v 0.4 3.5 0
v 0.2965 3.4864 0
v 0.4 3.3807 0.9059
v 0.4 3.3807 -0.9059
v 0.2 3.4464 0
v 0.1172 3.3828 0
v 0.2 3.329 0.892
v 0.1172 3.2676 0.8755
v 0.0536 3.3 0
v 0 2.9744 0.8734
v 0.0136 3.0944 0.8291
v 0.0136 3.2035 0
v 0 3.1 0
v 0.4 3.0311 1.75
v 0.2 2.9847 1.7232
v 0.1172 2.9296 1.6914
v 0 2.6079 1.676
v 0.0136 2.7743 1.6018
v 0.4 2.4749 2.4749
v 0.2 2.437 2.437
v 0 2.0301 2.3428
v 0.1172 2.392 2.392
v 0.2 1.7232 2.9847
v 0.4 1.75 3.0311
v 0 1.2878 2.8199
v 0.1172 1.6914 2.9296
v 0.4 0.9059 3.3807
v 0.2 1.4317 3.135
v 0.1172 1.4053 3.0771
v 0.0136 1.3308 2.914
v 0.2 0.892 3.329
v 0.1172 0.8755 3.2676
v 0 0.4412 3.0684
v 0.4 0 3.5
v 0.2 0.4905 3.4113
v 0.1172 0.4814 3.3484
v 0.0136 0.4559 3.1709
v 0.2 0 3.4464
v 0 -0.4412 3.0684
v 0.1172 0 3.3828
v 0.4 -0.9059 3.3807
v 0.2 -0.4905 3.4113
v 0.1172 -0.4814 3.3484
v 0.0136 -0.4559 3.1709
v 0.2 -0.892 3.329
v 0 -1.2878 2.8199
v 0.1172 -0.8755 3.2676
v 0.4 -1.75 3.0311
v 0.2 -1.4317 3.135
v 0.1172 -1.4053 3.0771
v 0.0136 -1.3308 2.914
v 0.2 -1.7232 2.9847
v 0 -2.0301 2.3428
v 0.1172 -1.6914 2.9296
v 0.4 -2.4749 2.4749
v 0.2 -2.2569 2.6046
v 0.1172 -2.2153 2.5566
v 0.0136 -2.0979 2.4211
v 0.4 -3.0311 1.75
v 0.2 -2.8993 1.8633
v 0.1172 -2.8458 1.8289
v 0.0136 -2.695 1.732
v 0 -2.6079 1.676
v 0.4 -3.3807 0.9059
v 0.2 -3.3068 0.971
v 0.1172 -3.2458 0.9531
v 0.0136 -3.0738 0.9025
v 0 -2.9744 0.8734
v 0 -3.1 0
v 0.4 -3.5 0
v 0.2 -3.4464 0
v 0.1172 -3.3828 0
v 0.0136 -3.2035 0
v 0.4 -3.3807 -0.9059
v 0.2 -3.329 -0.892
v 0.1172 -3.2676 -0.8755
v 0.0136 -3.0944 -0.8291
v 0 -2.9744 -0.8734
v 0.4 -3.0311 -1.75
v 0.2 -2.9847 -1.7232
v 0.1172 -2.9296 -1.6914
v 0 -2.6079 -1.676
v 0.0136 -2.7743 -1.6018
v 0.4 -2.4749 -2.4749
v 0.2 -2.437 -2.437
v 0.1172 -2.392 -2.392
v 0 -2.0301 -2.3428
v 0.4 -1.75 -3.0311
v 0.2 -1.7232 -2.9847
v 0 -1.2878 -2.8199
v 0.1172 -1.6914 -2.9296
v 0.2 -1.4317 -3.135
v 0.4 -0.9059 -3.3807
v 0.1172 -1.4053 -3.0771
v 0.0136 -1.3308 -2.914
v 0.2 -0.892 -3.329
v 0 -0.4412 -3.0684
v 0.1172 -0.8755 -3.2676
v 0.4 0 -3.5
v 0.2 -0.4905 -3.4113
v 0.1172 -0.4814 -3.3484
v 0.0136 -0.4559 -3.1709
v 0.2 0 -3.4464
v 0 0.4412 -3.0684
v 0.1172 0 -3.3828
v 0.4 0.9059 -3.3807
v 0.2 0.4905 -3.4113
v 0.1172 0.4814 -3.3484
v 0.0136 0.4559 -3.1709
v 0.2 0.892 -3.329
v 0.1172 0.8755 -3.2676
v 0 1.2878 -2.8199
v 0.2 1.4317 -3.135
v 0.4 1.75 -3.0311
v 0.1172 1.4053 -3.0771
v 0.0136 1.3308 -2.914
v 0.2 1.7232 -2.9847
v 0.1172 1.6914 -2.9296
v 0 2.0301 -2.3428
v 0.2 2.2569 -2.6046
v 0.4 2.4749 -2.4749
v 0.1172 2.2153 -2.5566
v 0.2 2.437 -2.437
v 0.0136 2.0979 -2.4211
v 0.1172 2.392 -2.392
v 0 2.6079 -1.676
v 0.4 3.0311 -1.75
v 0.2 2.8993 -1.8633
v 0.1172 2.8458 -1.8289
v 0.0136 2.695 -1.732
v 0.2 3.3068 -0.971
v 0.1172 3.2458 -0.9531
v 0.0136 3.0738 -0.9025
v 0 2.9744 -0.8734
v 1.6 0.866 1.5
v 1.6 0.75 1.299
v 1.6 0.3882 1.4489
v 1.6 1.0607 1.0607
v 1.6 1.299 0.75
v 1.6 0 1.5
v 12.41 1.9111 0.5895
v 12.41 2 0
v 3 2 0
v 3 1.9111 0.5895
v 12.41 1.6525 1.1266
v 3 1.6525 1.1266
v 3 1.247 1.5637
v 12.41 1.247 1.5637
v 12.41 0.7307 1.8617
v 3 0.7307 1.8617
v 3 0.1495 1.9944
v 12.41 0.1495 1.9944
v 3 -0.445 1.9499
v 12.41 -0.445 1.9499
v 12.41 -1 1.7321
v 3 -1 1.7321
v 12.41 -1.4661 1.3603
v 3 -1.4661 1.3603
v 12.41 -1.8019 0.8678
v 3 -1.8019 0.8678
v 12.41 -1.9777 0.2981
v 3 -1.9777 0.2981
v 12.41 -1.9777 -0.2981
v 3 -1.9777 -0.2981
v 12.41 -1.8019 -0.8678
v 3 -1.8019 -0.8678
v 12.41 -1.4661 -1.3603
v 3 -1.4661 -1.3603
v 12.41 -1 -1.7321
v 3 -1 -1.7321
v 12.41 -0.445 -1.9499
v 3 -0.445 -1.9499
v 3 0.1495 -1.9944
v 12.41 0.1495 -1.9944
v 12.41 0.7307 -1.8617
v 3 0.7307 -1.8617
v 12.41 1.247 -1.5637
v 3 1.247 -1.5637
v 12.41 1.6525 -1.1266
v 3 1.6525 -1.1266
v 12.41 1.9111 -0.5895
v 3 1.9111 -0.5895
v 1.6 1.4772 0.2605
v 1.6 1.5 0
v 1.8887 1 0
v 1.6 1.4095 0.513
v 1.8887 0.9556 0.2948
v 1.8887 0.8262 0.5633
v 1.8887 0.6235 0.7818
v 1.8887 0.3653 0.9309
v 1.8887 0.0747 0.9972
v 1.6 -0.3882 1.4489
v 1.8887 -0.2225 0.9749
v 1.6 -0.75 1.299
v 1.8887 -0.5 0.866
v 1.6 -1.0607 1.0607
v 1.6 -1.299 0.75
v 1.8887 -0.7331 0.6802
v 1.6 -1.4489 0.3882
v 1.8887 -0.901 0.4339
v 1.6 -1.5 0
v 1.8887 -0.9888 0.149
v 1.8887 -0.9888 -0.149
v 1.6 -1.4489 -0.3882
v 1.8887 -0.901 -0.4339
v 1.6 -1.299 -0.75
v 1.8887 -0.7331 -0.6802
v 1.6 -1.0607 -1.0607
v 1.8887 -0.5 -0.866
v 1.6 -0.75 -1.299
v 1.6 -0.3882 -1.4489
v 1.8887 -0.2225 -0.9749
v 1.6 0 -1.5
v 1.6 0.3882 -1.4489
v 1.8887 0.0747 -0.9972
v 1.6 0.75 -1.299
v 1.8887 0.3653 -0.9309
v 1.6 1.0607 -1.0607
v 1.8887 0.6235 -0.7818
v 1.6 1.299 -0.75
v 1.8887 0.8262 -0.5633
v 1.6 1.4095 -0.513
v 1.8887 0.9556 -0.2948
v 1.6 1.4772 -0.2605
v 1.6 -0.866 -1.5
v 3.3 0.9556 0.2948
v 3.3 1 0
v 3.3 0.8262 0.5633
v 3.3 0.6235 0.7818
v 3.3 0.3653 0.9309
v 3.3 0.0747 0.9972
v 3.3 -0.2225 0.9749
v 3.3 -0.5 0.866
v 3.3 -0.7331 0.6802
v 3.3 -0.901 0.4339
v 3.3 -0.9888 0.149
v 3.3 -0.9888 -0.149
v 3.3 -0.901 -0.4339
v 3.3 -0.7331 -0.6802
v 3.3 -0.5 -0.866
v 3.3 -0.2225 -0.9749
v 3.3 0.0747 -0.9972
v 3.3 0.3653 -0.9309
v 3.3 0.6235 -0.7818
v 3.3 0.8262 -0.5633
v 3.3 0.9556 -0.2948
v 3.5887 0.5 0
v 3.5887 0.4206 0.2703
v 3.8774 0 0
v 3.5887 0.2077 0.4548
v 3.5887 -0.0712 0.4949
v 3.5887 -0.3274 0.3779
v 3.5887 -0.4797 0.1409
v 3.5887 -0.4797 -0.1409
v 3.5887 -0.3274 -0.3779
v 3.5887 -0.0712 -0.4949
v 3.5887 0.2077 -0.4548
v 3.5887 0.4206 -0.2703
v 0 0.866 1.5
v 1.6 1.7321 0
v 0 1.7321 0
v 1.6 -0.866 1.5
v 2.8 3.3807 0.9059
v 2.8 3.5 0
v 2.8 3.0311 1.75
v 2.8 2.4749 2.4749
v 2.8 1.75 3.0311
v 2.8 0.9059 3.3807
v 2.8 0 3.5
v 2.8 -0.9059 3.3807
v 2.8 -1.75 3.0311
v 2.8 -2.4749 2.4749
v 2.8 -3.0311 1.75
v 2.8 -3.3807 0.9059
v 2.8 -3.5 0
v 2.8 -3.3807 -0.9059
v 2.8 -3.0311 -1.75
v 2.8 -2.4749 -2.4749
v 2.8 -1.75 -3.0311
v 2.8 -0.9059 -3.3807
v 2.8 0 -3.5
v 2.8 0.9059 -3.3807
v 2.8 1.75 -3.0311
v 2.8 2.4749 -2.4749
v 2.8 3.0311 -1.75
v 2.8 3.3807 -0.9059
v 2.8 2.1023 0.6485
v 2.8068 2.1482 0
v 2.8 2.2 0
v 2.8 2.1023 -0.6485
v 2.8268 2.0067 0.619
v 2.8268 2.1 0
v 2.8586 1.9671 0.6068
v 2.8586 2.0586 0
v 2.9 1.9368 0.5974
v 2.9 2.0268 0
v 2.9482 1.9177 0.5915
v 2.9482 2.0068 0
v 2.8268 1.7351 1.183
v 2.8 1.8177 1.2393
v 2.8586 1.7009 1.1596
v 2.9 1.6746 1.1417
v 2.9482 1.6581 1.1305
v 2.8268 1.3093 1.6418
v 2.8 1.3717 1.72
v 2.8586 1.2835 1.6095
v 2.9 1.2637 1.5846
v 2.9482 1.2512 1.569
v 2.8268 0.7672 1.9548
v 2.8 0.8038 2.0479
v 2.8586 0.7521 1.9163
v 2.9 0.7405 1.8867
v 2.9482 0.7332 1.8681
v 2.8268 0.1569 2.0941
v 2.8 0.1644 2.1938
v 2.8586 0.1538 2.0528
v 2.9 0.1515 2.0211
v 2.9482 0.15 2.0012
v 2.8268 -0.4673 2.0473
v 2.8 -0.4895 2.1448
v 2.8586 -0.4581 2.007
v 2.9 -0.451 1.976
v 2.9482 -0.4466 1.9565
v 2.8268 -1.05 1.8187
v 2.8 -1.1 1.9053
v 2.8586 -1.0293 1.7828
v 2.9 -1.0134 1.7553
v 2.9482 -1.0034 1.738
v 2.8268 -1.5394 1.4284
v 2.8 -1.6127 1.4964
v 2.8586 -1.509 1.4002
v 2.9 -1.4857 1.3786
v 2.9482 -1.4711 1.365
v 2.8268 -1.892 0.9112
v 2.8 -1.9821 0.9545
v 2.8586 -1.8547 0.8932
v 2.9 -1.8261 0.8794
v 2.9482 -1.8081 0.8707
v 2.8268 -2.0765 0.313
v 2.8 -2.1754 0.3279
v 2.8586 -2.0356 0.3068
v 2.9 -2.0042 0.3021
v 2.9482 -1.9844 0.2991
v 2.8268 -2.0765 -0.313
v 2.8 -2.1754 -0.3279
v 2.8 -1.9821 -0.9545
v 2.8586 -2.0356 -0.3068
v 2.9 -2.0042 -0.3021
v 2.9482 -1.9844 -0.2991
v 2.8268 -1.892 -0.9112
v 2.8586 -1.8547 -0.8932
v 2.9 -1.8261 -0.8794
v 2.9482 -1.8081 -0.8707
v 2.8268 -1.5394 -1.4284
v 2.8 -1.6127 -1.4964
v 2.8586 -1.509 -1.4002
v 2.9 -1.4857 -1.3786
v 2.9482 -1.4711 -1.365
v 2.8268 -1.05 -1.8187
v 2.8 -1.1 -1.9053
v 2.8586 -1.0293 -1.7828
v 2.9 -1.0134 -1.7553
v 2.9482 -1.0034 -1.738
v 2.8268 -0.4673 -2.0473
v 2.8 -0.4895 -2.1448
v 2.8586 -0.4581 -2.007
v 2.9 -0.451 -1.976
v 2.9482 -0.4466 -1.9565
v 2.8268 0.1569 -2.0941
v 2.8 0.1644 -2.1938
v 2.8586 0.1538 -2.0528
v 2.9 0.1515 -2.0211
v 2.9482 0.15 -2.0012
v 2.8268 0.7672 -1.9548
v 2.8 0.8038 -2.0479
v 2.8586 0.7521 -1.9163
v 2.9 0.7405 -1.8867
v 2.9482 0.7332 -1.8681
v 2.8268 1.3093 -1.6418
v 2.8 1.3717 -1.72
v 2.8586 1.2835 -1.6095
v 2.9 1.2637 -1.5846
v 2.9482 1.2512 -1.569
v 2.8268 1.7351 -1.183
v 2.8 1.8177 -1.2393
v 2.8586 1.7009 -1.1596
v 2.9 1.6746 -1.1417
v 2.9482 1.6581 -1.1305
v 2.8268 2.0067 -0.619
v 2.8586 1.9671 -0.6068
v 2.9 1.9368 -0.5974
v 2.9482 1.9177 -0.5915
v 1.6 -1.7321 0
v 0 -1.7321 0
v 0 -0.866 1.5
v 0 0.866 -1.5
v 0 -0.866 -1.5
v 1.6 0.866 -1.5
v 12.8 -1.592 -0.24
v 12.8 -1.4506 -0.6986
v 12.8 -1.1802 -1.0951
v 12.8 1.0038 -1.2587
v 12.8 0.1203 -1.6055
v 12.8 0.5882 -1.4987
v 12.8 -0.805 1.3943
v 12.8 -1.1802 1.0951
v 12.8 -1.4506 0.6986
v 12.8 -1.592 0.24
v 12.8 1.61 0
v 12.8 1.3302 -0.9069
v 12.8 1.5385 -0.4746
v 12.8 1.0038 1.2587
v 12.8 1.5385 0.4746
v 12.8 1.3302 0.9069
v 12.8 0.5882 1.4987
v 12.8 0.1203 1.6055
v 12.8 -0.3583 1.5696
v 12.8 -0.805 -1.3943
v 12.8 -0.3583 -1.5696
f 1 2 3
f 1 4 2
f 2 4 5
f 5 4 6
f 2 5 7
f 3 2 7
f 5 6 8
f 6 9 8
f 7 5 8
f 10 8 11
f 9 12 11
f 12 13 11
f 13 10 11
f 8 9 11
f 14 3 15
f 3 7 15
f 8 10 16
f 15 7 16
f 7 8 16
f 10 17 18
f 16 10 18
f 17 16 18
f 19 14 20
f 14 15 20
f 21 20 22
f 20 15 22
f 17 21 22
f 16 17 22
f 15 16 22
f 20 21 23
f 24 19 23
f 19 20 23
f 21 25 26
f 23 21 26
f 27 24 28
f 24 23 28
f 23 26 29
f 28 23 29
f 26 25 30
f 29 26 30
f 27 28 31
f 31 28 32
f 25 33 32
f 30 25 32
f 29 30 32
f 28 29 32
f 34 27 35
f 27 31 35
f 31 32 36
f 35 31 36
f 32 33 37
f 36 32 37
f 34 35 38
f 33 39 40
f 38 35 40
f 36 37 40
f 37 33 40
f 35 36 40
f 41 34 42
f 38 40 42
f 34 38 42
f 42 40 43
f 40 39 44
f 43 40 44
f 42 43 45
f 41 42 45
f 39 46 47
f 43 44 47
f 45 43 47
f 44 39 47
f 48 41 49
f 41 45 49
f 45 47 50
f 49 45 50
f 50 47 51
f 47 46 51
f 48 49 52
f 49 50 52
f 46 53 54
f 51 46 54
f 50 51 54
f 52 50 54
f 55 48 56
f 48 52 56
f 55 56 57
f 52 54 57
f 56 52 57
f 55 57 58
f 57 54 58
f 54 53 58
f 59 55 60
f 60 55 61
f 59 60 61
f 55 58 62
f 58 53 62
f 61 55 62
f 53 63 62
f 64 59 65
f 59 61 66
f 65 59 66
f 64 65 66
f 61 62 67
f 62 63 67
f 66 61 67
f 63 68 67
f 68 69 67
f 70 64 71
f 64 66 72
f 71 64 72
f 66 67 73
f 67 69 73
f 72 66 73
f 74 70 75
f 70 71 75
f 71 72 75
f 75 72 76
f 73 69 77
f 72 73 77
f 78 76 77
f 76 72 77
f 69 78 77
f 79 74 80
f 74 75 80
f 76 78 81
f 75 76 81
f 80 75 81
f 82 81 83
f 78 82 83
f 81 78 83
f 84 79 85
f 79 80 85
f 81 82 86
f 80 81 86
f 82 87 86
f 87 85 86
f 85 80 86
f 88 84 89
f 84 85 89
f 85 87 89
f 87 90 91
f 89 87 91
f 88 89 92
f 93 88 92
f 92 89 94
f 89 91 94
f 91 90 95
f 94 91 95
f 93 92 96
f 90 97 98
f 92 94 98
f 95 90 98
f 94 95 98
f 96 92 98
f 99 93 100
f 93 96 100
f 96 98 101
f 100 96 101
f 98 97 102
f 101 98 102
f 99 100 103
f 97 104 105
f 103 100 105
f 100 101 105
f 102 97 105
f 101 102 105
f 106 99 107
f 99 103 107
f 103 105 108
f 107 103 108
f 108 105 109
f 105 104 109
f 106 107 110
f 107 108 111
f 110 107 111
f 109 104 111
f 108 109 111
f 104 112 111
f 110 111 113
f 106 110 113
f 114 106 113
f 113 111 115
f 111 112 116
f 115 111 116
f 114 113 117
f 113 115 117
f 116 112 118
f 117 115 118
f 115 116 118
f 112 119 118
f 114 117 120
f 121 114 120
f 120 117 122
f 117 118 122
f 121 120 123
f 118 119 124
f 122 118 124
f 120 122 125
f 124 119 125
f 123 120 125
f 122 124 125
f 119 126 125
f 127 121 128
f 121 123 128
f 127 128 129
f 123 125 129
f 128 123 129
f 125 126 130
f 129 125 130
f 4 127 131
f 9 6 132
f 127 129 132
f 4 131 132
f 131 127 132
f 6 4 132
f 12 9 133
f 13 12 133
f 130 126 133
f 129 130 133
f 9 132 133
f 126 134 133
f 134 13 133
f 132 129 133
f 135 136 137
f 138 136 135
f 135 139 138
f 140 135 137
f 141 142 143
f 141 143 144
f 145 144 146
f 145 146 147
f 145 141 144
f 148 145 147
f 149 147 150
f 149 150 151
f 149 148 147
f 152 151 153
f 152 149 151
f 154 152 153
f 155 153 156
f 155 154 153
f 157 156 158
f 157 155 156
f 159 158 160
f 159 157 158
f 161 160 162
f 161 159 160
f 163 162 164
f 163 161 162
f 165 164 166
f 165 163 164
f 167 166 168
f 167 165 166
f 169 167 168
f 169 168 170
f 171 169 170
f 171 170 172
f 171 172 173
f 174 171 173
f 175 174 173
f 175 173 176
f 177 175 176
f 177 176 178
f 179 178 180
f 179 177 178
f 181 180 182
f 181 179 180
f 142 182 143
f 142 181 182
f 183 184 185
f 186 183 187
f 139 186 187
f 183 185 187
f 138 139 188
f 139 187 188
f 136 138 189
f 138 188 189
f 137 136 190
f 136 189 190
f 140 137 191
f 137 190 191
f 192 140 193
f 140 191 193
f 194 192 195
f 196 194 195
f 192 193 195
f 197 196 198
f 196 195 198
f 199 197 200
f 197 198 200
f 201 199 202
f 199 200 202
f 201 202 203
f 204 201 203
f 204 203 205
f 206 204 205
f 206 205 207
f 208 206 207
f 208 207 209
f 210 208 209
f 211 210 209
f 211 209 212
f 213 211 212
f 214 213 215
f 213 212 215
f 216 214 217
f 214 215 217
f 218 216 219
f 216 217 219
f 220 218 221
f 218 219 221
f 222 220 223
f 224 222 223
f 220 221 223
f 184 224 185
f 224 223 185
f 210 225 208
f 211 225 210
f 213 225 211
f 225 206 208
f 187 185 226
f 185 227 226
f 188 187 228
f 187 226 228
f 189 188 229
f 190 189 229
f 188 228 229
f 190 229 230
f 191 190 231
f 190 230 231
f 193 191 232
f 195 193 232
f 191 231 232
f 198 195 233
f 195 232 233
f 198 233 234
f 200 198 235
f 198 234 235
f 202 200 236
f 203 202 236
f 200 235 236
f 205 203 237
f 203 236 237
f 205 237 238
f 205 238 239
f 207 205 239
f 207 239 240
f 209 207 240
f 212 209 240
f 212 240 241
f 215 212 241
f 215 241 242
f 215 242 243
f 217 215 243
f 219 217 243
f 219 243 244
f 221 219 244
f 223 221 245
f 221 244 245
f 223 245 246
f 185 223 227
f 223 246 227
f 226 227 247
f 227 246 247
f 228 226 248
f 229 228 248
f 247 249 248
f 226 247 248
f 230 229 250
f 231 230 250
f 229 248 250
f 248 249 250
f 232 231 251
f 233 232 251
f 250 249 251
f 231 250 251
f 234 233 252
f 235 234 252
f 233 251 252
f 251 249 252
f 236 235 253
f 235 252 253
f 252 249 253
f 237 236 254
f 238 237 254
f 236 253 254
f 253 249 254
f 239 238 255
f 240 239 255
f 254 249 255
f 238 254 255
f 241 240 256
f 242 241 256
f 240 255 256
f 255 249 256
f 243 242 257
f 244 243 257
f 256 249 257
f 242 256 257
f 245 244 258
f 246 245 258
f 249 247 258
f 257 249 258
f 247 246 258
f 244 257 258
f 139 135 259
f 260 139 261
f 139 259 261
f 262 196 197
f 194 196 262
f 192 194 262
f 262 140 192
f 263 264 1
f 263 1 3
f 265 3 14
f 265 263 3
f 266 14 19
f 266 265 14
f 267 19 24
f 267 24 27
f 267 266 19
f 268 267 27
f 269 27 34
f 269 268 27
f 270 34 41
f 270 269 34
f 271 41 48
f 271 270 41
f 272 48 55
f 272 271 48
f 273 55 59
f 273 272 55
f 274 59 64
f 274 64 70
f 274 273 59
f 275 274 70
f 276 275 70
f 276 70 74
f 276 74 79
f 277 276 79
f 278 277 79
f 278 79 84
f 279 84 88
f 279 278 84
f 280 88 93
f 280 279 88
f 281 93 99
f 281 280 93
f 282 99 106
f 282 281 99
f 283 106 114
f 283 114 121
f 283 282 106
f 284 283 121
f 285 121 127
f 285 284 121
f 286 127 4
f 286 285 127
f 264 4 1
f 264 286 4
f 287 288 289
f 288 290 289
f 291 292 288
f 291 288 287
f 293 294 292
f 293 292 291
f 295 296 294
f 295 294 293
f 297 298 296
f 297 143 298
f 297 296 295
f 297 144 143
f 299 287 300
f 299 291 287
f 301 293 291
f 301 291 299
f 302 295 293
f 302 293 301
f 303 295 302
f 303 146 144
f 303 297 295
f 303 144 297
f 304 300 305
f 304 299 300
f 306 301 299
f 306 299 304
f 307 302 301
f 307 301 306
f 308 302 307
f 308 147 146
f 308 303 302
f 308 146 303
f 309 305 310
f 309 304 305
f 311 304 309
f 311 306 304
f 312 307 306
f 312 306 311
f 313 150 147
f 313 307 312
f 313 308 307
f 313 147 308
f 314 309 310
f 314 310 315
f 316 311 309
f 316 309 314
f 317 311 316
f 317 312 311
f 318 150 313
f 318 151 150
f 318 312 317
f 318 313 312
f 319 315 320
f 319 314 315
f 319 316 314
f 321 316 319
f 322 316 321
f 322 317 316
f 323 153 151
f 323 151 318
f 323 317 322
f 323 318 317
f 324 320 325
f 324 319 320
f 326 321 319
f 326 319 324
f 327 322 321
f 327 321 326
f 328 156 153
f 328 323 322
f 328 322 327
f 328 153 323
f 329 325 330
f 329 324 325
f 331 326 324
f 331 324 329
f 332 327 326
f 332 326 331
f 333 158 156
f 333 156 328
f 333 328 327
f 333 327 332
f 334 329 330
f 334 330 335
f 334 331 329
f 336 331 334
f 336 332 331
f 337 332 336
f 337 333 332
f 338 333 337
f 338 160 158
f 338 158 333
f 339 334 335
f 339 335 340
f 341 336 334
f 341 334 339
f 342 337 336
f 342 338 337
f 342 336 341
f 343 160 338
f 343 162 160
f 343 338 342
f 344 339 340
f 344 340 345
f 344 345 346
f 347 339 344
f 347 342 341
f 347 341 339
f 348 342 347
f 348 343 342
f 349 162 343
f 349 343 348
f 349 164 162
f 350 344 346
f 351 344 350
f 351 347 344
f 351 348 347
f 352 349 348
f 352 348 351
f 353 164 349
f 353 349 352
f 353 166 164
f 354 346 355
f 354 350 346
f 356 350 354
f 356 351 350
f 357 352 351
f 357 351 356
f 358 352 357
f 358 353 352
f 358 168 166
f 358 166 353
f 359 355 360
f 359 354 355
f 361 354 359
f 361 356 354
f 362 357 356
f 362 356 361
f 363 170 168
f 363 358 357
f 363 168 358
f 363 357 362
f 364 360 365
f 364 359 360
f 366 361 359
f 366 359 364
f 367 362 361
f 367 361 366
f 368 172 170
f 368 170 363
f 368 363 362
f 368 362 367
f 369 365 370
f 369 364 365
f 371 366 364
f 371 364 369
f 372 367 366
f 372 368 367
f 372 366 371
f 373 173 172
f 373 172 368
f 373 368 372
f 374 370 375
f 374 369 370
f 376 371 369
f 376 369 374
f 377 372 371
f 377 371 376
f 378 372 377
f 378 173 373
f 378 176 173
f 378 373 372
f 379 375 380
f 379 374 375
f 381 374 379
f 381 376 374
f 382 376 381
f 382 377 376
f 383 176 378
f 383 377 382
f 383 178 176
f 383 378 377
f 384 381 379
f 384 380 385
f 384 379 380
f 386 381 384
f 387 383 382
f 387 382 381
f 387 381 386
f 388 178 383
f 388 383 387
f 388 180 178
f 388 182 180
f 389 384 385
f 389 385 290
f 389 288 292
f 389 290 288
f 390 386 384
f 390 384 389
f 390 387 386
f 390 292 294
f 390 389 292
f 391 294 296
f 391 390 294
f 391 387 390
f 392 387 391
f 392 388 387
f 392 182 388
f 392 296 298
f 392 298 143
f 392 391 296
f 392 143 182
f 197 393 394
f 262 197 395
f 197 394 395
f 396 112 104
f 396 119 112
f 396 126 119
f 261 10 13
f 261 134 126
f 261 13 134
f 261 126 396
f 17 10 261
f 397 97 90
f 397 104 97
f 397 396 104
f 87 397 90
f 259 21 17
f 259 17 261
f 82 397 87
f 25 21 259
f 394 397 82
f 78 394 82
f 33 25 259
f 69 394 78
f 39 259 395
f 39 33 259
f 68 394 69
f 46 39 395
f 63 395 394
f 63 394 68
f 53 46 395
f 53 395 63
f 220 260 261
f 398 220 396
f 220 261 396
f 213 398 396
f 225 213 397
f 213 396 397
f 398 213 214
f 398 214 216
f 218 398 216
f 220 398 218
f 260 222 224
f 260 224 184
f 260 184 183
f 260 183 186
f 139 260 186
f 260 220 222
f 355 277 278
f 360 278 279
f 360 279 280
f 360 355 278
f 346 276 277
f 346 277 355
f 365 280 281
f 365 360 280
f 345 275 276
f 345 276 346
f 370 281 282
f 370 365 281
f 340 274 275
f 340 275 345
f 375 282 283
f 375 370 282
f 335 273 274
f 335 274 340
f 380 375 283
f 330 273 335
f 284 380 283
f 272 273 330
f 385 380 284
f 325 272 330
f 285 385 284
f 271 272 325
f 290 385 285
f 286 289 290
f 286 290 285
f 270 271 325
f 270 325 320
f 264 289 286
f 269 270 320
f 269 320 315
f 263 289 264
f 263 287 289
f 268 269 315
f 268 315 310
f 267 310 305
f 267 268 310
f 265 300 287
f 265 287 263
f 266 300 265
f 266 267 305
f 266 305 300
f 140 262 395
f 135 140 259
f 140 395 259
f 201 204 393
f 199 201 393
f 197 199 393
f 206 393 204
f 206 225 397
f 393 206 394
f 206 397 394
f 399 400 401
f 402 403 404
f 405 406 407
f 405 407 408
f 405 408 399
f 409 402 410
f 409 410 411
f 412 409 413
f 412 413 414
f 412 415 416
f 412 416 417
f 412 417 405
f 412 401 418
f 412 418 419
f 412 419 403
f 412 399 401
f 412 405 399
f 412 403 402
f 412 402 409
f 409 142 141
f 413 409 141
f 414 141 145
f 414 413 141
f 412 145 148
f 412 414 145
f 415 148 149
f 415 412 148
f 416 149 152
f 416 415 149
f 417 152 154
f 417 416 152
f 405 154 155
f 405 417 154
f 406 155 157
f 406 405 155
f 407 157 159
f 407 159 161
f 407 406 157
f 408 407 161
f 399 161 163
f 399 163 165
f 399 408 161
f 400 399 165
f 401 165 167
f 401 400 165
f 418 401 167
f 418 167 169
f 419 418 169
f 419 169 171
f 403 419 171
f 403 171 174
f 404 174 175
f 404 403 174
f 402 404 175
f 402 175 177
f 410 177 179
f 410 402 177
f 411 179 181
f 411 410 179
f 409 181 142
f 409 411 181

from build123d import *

# Parameters (mm, degrees)
FILLET1_R   = 0.2
FILLET2_R   = 0.4
HEX_2_DEPTH = 1.6


with BuildPart() as part:
    # BodySke → Base-Revolve (revolve)
    with BuildSketch(Plane.XY):
        Polygon((0, 0), (0, 3.5), (2.8, 3.5), (2.8, 2), (12.41, 2), (12.8, 1.61), (12.8, 0), align=None)
    revolve(axis=Axis((-31.75, 0, 0), (1, 0, 0)))

    # Fillet1
    fillet1_edges = [part.edges().sort_by_distance(p)[0] for p in [
        (2.8, -2, 0),
    ]]
    fillet(fillet1_edges, radius=FILLET1_R)

    # Fillet2
    fillet2_edges = [part.edges().sort_by_distance(p)[0] for p in [
        (0, -3.5, 0),
    ]]
    fillet(fillet2_edges, radius=FILLET2_R)

    # HexSke → Hex 2 (cut)
    with BuildSketch(Plane(origin=(0, 0, 0), x_dir=(0, 0.5, 0.866025404), z_dir=(-1, 0, 0))):
        Polygon((0.866025404, 1.5), (-0.866025404, 1.5), (-1.732050808, 0), (-0.866025404, -1.5), (0.866025404, -1.5), (1.732050808, 0), align=None)
    extrude(amount=-HEX_2_DEPTH, mode=Mode.SUBTRACT)

    # PilotSke → Hex-PreBroach (revolve, cut)
    with BuildSketch(Plane.XY):
        Polygon((0, 1.5), (1.6, 1.5), (1.888675135, 1), (3.3, 1), (3.877350269, 0), (0, 0), align=None)
    revolve(axis=Axis((0, 0, 0), (1, 0, 0)), mode=Mode.SUBTRACT)


solid = part.part
